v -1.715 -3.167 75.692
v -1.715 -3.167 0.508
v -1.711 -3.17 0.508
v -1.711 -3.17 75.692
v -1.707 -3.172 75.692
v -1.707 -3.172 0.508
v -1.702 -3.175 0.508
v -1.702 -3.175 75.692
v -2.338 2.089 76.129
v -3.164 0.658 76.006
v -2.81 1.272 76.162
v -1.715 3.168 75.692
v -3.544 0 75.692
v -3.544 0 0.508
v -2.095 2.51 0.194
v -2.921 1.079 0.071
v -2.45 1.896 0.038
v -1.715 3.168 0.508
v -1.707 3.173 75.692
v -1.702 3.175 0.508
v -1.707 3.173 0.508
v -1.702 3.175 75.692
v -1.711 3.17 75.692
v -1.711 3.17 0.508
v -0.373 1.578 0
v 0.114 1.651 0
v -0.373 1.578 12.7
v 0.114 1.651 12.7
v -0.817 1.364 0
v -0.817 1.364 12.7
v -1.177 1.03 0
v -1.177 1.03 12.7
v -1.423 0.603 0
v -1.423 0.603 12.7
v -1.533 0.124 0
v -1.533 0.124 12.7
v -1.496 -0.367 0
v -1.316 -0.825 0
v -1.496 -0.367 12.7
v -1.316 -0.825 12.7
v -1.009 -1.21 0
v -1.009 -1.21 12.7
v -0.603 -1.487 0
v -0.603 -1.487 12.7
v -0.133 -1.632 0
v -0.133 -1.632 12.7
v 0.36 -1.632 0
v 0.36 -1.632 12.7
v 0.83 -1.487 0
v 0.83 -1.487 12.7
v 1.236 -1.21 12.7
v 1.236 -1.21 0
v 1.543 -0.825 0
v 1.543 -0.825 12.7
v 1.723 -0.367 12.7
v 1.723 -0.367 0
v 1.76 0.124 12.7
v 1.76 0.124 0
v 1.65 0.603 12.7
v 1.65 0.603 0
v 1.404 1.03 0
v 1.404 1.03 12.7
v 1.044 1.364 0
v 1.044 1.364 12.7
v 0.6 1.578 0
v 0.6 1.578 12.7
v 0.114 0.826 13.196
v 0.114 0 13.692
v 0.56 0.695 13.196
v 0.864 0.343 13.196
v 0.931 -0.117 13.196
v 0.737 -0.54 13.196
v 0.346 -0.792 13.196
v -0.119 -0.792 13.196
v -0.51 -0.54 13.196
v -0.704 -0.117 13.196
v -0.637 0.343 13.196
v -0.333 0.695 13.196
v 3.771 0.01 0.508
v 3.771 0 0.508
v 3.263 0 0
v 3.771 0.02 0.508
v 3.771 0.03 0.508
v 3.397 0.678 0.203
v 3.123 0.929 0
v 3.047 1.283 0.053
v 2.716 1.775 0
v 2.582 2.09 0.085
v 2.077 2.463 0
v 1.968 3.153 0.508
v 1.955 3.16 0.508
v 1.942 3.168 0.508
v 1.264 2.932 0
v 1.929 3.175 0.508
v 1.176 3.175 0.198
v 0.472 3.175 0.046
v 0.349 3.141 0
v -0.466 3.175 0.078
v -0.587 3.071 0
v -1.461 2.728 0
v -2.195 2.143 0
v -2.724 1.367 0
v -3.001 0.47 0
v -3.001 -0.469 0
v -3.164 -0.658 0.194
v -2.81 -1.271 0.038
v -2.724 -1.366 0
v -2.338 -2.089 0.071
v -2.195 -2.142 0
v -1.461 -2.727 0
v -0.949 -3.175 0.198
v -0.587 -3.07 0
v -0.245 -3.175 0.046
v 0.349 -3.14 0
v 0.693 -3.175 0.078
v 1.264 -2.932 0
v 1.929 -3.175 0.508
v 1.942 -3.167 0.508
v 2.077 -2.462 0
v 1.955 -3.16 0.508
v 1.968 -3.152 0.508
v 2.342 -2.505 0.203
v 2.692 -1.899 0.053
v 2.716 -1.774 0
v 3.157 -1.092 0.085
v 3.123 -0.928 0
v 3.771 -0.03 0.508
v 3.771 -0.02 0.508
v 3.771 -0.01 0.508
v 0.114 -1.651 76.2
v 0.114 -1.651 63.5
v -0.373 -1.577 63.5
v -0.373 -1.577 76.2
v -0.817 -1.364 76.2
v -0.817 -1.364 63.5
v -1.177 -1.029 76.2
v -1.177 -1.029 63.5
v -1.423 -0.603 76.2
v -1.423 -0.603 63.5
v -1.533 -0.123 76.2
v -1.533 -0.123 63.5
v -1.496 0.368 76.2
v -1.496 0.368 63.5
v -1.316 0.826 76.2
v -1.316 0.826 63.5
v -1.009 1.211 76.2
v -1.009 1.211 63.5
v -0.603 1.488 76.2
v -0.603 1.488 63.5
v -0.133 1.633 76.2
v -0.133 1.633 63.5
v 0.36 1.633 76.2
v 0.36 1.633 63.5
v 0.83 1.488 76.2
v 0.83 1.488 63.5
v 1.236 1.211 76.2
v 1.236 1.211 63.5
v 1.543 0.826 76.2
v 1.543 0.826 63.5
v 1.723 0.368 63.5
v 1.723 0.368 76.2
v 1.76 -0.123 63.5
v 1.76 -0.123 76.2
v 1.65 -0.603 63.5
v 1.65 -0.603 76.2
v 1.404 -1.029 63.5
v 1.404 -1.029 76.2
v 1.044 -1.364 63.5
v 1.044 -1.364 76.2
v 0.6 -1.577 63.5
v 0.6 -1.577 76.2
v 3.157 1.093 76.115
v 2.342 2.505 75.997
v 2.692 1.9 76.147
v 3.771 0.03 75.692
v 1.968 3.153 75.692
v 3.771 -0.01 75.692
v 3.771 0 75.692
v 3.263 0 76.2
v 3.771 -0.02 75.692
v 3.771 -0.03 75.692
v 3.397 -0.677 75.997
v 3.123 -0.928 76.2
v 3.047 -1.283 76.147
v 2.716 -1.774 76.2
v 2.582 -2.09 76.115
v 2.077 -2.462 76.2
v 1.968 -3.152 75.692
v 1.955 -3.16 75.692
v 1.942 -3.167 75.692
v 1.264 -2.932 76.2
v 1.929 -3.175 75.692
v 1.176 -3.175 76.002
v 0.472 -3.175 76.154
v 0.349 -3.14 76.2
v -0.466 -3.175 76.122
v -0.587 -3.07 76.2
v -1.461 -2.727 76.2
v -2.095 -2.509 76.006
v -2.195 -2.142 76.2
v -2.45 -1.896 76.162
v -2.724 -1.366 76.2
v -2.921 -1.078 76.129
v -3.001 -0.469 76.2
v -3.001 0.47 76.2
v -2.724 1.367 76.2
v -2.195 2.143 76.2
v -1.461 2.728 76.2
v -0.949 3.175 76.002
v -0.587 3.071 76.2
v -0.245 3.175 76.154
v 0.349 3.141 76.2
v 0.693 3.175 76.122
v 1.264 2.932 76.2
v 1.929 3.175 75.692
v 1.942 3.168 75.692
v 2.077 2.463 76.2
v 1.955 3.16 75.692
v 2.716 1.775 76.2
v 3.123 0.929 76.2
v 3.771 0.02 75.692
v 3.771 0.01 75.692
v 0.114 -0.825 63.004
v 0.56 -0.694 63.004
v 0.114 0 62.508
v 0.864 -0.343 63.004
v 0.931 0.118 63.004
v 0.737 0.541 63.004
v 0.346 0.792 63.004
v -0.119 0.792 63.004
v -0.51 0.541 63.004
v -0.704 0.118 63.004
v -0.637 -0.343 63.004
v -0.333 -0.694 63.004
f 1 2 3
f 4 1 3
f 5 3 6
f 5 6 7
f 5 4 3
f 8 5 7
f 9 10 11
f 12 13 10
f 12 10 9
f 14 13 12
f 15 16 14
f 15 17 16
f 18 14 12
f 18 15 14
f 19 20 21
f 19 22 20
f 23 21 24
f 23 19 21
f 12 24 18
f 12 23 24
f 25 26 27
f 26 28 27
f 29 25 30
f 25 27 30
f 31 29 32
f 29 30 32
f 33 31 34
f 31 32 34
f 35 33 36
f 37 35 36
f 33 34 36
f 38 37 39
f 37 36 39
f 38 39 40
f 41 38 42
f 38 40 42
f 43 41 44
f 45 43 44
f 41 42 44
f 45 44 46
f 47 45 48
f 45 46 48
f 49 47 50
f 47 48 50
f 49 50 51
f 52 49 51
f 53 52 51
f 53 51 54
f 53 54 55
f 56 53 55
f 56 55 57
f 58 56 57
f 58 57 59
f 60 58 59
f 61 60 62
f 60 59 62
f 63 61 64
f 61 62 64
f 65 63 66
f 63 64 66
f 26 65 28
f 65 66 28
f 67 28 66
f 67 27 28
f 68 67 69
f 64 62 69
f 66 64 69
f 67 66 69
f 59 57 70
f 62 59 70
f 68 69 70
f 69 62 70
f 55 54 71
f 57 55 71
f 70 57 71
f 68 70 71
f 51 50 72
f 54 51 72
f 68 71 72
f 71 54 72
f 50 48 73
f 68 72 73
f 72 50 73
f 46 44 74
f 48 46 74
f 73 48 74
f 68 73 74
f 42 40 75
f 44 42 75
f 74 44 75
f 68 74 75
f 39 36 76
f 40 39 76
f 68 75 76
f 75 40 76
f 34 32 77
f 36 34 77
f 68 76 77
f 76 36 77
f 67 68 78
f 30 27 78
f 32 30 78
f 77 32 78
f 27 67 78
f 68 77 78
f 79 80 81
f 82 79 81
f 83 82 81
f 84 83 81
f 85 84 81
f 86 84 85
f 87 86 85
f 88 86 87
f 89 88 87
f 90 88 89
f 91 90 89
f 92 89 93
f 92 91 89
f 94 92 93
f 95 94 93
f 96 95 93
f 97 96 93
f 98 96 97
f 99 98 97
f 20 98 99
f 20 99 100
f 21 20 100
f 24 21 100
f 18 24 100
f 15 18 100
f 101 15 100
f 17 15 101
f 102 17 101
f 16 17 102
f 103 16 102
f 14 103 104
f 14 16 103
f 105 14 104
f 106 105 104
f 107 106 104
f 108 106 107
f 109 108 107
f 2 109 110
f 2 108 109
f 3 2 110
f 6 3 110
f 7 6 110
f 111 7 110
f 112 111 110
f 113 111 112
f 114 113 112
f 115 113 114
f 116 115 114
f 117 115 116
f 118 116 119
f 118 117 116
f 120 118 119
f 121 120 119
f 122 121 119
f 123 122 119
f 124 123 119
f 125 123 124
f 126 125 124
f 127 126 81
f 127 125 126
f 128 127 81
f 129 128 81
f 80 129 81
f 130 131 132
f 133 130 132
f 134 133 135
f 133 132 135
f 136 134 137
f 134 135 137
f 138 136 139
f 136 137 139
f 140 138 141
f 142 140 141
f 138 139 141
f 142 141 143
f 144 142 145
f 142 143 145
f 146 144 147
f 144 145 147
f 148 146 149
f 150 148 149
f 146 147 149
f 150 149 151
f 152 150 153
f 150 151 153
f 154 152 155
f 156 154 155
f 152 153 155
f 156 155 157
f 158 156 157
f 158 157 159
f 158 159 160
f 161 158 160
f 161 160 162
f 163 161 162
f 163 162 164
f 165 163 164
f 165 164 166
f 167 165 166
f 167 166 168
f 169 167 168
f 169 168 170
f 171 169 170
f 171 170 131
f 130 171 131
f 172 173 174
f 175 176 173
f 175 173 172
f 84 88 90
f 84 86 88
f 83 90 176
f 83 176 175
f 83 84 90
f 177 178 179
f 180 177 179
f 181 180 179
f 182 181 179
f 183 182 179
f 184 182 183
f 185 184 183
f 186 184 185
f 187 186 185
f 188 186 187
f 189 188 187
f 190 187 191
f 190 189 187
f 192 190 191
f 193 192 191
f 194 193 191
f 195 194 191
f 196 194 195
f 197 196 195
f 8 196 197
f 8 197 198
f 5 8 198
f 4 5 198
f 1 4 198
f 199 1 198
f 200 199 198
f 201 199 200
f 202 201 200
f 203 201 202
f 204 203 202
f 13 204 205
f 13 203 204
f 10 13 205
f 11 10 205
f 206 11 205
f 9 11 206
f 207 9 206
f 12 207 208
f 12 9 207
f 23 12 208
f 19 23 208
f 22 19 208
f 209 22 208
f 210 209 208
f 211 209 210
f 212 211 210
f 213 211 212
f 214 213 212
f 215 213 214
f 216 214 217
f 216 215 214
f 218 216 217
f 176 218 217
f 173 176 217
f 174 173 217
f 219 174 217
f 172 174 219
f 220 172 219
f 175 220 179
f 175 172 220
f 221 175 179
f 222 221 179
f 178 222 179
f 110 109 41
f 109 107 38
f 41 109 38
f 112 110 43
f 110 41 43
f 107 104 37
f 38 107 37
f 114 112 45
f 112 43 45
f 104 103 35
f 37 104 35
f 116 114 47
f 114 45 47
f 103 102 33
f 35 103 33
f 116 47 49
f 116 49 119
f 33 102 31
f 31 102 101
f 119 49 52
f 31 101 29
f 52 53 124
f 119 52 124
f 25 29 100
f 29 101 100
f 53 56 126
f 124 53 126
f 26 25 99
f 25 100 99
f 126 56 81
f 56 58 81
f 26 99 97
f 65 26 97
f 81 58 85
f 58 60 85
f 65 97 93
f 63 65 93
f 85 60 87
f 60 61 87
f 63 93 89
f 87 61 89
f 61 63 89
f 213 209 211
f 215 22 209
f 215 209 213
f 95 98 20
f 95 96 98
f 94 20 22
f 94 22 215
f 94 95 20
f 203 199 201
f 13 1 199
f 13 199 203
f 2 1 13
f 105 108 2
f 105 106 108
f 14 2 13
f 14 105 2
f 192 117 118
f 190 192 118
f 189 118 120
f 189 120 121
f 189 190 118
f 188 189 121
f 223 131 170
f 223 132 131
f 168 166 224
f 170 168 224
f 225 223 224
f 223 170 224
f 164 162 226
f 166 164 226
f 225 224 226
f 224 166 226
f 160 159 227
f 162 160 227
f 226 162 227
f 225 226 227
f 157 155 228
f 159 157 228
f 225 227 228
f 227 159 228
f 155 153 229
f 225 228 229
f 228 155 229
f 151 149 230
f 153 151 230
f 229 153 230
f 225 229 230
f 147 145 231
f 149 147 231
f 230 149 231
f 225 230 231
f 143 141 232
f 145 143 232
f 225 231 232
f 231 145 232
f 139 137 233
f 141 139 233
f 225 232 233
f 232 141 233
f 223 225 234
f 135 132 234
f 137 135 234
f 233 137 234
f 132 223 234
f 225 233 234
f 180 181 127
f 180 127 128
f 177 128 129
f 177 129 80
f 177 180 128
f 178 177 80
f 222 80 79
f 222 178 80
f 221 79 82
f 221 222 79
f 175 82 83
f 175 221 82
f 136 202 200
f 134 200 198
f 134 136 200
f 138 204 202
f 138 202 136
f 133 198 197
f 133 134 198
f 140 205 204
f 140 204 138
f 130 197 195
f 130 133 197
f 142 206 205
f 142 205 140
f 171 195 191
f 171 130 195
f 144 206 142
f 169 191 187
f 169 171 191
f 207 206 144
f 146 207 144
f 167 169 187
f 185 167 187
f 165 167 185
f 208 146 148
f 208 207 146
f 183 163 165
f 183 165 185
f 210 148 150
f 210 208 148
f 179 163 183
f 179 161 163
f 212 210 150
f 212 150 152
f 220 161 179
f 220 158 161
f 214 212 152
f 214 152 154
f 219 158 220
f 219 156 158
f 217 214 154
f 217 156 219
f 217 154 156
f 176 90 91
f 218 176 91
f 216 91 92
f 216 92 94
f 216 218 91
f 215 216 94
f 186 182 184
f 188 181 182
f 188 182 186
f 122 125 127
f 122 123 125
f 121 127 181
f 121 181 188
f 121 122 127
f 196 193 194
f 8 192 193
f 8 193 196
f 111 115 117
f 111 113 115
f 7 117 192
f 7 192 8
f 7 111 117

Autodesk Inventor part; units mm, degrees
ref_plane "YZ Plane" through (0, 0, 0) normal (1, 0, 0) x (0, 1, 0)
ref_plane "XZ Plane" through (0, 0, 0) normal (0, 1, 0) x (-1, 0, 0)
sketch "Sketch1" plane through (0, 0, 0) normal (0, 0, 1) x (1, 0, 0)
  line L0 (1.9552, -3.1747) -> (-1.711, -3.1747)
  line L1 (-1.711, -3.1747) -> (-3.5441, 0.0003)
  line L2 (-3.5441, 0.0003) -> (-1.711, 3.1753)
  line L3 (-1.711, 3.1753) -> (1.9552, 3.1753)
  line L4 (1.9552, 3.1753) -> (3.7883, 0.0003)
  line L5 (3.7883, 0.0003) -> (1.9552, -3.1747)
  point P0 (0.1221, 0.0003)
  dimension "d0" = 6.35
extrude "Extrusion1" add sketch "Sketch1" along normal blind 76.2
ref_plane "Work Plane1" through (-1.711, 0.0003, 0) normal (0, 1, 0) x (1, 0, 0)
sketch "Sketch3" plane through (-1.711, 0.0003, 0) normal (0, 1, 0) x (1, 0, 0)
  line L0 (-1.3251, 0) -> (4.9741, 0)
  line L1 (5.4821, -0.508) -> (5.4821, -75.692)
  line L2 (4.9741, -76.2) -> (-1.3251, -76.2)
  line L3 (-1.8331, -75.692) -> (-1.8331, -0.508)
  line L4 (-1.8331, -0.508) -> (-1.3251, 0)
  line L5 (4.9741, 0) -> (5.4821, -0.508)
  line L6 (-1.3251, -76.2) -> (-1.8331, -75.692)
  line L7 (5.4821, -75.692) -> (4.9741, -76.2)
  line L8 (-1.8331, 0) -> (-1.8331, -76.2) projected
  line L9 (3.6662, 0) -> (5.4993, 0) projected
  line L10 (1.8245, 0) -> (1.8245, -76.2)
  point P0 (-1.8331, 0)
  point P1 (5.4821, -76.2)
  point P2 (5.4821, 0)
  point P3 (-1.8331, -76.2)
  dimension "d5" = 0.508
  dimension "d6" = 0.508
  dimension "d7" = 0.508
  dimension "d8" = 0.508
  dimension "d9" = 0.508
  dimension "d10" = 0.508
  dimension "d11" = 0.508
  dimension "d12" = 0.508
  dimension "d13" = 7.3152
  dimension "d14" = 0
  dimension "d15" = 76.2
  dimension "d16" = 0
revolve "Revolution1" cut sketch "Sketch3" angle 360 about axis through (0.1135, 0.0003, 0) along (0, 0, 1) keep common part contours L0 L5 L1 L7 L2 L10
sketch "Sketch5" plane through (0.1135, 0.0003, 76.2) normal (0, 0, 1) x (1, 0, 0)
  circle A0 centre (0, 0) radius 3.1496 projected
hole "Hole2" at (0.1135, 0.0003, 76.2) at (0.1135, 0.0003, 76.2) direction (0, 0, -1) diameter 3.302 depth 12.7 tip angle 118 thread size "8-32 UNC" class "2B" standard "ANSI Unified Screw Threads"
sketch "Sketch6" plane through (0.1135, 0.0003, 0) normal (0, 0, -1) x (-1, 0, 0)
  circle A0 centre (0, 0) radius 3.1496 projected
hole "Hole3" at (0.1135, 0.0003, 0) direction (0, 0, 1) diameter 3.302 depth 12.7 tip angle 118 thread size "8-32 UNC" class "2B" standard "ANSI Unified Screw Threads"
equation "\"d6\" = d5"
equation "\"d7\" = d5"
equation "\"d8\" = d7"
equation "\"d9\" = d5"
equation "\"d10\" = d9"
equation "\"d11\" = d5"
equation "\"d12\" = d11"
properties part number "275-1020" material "Steel"
